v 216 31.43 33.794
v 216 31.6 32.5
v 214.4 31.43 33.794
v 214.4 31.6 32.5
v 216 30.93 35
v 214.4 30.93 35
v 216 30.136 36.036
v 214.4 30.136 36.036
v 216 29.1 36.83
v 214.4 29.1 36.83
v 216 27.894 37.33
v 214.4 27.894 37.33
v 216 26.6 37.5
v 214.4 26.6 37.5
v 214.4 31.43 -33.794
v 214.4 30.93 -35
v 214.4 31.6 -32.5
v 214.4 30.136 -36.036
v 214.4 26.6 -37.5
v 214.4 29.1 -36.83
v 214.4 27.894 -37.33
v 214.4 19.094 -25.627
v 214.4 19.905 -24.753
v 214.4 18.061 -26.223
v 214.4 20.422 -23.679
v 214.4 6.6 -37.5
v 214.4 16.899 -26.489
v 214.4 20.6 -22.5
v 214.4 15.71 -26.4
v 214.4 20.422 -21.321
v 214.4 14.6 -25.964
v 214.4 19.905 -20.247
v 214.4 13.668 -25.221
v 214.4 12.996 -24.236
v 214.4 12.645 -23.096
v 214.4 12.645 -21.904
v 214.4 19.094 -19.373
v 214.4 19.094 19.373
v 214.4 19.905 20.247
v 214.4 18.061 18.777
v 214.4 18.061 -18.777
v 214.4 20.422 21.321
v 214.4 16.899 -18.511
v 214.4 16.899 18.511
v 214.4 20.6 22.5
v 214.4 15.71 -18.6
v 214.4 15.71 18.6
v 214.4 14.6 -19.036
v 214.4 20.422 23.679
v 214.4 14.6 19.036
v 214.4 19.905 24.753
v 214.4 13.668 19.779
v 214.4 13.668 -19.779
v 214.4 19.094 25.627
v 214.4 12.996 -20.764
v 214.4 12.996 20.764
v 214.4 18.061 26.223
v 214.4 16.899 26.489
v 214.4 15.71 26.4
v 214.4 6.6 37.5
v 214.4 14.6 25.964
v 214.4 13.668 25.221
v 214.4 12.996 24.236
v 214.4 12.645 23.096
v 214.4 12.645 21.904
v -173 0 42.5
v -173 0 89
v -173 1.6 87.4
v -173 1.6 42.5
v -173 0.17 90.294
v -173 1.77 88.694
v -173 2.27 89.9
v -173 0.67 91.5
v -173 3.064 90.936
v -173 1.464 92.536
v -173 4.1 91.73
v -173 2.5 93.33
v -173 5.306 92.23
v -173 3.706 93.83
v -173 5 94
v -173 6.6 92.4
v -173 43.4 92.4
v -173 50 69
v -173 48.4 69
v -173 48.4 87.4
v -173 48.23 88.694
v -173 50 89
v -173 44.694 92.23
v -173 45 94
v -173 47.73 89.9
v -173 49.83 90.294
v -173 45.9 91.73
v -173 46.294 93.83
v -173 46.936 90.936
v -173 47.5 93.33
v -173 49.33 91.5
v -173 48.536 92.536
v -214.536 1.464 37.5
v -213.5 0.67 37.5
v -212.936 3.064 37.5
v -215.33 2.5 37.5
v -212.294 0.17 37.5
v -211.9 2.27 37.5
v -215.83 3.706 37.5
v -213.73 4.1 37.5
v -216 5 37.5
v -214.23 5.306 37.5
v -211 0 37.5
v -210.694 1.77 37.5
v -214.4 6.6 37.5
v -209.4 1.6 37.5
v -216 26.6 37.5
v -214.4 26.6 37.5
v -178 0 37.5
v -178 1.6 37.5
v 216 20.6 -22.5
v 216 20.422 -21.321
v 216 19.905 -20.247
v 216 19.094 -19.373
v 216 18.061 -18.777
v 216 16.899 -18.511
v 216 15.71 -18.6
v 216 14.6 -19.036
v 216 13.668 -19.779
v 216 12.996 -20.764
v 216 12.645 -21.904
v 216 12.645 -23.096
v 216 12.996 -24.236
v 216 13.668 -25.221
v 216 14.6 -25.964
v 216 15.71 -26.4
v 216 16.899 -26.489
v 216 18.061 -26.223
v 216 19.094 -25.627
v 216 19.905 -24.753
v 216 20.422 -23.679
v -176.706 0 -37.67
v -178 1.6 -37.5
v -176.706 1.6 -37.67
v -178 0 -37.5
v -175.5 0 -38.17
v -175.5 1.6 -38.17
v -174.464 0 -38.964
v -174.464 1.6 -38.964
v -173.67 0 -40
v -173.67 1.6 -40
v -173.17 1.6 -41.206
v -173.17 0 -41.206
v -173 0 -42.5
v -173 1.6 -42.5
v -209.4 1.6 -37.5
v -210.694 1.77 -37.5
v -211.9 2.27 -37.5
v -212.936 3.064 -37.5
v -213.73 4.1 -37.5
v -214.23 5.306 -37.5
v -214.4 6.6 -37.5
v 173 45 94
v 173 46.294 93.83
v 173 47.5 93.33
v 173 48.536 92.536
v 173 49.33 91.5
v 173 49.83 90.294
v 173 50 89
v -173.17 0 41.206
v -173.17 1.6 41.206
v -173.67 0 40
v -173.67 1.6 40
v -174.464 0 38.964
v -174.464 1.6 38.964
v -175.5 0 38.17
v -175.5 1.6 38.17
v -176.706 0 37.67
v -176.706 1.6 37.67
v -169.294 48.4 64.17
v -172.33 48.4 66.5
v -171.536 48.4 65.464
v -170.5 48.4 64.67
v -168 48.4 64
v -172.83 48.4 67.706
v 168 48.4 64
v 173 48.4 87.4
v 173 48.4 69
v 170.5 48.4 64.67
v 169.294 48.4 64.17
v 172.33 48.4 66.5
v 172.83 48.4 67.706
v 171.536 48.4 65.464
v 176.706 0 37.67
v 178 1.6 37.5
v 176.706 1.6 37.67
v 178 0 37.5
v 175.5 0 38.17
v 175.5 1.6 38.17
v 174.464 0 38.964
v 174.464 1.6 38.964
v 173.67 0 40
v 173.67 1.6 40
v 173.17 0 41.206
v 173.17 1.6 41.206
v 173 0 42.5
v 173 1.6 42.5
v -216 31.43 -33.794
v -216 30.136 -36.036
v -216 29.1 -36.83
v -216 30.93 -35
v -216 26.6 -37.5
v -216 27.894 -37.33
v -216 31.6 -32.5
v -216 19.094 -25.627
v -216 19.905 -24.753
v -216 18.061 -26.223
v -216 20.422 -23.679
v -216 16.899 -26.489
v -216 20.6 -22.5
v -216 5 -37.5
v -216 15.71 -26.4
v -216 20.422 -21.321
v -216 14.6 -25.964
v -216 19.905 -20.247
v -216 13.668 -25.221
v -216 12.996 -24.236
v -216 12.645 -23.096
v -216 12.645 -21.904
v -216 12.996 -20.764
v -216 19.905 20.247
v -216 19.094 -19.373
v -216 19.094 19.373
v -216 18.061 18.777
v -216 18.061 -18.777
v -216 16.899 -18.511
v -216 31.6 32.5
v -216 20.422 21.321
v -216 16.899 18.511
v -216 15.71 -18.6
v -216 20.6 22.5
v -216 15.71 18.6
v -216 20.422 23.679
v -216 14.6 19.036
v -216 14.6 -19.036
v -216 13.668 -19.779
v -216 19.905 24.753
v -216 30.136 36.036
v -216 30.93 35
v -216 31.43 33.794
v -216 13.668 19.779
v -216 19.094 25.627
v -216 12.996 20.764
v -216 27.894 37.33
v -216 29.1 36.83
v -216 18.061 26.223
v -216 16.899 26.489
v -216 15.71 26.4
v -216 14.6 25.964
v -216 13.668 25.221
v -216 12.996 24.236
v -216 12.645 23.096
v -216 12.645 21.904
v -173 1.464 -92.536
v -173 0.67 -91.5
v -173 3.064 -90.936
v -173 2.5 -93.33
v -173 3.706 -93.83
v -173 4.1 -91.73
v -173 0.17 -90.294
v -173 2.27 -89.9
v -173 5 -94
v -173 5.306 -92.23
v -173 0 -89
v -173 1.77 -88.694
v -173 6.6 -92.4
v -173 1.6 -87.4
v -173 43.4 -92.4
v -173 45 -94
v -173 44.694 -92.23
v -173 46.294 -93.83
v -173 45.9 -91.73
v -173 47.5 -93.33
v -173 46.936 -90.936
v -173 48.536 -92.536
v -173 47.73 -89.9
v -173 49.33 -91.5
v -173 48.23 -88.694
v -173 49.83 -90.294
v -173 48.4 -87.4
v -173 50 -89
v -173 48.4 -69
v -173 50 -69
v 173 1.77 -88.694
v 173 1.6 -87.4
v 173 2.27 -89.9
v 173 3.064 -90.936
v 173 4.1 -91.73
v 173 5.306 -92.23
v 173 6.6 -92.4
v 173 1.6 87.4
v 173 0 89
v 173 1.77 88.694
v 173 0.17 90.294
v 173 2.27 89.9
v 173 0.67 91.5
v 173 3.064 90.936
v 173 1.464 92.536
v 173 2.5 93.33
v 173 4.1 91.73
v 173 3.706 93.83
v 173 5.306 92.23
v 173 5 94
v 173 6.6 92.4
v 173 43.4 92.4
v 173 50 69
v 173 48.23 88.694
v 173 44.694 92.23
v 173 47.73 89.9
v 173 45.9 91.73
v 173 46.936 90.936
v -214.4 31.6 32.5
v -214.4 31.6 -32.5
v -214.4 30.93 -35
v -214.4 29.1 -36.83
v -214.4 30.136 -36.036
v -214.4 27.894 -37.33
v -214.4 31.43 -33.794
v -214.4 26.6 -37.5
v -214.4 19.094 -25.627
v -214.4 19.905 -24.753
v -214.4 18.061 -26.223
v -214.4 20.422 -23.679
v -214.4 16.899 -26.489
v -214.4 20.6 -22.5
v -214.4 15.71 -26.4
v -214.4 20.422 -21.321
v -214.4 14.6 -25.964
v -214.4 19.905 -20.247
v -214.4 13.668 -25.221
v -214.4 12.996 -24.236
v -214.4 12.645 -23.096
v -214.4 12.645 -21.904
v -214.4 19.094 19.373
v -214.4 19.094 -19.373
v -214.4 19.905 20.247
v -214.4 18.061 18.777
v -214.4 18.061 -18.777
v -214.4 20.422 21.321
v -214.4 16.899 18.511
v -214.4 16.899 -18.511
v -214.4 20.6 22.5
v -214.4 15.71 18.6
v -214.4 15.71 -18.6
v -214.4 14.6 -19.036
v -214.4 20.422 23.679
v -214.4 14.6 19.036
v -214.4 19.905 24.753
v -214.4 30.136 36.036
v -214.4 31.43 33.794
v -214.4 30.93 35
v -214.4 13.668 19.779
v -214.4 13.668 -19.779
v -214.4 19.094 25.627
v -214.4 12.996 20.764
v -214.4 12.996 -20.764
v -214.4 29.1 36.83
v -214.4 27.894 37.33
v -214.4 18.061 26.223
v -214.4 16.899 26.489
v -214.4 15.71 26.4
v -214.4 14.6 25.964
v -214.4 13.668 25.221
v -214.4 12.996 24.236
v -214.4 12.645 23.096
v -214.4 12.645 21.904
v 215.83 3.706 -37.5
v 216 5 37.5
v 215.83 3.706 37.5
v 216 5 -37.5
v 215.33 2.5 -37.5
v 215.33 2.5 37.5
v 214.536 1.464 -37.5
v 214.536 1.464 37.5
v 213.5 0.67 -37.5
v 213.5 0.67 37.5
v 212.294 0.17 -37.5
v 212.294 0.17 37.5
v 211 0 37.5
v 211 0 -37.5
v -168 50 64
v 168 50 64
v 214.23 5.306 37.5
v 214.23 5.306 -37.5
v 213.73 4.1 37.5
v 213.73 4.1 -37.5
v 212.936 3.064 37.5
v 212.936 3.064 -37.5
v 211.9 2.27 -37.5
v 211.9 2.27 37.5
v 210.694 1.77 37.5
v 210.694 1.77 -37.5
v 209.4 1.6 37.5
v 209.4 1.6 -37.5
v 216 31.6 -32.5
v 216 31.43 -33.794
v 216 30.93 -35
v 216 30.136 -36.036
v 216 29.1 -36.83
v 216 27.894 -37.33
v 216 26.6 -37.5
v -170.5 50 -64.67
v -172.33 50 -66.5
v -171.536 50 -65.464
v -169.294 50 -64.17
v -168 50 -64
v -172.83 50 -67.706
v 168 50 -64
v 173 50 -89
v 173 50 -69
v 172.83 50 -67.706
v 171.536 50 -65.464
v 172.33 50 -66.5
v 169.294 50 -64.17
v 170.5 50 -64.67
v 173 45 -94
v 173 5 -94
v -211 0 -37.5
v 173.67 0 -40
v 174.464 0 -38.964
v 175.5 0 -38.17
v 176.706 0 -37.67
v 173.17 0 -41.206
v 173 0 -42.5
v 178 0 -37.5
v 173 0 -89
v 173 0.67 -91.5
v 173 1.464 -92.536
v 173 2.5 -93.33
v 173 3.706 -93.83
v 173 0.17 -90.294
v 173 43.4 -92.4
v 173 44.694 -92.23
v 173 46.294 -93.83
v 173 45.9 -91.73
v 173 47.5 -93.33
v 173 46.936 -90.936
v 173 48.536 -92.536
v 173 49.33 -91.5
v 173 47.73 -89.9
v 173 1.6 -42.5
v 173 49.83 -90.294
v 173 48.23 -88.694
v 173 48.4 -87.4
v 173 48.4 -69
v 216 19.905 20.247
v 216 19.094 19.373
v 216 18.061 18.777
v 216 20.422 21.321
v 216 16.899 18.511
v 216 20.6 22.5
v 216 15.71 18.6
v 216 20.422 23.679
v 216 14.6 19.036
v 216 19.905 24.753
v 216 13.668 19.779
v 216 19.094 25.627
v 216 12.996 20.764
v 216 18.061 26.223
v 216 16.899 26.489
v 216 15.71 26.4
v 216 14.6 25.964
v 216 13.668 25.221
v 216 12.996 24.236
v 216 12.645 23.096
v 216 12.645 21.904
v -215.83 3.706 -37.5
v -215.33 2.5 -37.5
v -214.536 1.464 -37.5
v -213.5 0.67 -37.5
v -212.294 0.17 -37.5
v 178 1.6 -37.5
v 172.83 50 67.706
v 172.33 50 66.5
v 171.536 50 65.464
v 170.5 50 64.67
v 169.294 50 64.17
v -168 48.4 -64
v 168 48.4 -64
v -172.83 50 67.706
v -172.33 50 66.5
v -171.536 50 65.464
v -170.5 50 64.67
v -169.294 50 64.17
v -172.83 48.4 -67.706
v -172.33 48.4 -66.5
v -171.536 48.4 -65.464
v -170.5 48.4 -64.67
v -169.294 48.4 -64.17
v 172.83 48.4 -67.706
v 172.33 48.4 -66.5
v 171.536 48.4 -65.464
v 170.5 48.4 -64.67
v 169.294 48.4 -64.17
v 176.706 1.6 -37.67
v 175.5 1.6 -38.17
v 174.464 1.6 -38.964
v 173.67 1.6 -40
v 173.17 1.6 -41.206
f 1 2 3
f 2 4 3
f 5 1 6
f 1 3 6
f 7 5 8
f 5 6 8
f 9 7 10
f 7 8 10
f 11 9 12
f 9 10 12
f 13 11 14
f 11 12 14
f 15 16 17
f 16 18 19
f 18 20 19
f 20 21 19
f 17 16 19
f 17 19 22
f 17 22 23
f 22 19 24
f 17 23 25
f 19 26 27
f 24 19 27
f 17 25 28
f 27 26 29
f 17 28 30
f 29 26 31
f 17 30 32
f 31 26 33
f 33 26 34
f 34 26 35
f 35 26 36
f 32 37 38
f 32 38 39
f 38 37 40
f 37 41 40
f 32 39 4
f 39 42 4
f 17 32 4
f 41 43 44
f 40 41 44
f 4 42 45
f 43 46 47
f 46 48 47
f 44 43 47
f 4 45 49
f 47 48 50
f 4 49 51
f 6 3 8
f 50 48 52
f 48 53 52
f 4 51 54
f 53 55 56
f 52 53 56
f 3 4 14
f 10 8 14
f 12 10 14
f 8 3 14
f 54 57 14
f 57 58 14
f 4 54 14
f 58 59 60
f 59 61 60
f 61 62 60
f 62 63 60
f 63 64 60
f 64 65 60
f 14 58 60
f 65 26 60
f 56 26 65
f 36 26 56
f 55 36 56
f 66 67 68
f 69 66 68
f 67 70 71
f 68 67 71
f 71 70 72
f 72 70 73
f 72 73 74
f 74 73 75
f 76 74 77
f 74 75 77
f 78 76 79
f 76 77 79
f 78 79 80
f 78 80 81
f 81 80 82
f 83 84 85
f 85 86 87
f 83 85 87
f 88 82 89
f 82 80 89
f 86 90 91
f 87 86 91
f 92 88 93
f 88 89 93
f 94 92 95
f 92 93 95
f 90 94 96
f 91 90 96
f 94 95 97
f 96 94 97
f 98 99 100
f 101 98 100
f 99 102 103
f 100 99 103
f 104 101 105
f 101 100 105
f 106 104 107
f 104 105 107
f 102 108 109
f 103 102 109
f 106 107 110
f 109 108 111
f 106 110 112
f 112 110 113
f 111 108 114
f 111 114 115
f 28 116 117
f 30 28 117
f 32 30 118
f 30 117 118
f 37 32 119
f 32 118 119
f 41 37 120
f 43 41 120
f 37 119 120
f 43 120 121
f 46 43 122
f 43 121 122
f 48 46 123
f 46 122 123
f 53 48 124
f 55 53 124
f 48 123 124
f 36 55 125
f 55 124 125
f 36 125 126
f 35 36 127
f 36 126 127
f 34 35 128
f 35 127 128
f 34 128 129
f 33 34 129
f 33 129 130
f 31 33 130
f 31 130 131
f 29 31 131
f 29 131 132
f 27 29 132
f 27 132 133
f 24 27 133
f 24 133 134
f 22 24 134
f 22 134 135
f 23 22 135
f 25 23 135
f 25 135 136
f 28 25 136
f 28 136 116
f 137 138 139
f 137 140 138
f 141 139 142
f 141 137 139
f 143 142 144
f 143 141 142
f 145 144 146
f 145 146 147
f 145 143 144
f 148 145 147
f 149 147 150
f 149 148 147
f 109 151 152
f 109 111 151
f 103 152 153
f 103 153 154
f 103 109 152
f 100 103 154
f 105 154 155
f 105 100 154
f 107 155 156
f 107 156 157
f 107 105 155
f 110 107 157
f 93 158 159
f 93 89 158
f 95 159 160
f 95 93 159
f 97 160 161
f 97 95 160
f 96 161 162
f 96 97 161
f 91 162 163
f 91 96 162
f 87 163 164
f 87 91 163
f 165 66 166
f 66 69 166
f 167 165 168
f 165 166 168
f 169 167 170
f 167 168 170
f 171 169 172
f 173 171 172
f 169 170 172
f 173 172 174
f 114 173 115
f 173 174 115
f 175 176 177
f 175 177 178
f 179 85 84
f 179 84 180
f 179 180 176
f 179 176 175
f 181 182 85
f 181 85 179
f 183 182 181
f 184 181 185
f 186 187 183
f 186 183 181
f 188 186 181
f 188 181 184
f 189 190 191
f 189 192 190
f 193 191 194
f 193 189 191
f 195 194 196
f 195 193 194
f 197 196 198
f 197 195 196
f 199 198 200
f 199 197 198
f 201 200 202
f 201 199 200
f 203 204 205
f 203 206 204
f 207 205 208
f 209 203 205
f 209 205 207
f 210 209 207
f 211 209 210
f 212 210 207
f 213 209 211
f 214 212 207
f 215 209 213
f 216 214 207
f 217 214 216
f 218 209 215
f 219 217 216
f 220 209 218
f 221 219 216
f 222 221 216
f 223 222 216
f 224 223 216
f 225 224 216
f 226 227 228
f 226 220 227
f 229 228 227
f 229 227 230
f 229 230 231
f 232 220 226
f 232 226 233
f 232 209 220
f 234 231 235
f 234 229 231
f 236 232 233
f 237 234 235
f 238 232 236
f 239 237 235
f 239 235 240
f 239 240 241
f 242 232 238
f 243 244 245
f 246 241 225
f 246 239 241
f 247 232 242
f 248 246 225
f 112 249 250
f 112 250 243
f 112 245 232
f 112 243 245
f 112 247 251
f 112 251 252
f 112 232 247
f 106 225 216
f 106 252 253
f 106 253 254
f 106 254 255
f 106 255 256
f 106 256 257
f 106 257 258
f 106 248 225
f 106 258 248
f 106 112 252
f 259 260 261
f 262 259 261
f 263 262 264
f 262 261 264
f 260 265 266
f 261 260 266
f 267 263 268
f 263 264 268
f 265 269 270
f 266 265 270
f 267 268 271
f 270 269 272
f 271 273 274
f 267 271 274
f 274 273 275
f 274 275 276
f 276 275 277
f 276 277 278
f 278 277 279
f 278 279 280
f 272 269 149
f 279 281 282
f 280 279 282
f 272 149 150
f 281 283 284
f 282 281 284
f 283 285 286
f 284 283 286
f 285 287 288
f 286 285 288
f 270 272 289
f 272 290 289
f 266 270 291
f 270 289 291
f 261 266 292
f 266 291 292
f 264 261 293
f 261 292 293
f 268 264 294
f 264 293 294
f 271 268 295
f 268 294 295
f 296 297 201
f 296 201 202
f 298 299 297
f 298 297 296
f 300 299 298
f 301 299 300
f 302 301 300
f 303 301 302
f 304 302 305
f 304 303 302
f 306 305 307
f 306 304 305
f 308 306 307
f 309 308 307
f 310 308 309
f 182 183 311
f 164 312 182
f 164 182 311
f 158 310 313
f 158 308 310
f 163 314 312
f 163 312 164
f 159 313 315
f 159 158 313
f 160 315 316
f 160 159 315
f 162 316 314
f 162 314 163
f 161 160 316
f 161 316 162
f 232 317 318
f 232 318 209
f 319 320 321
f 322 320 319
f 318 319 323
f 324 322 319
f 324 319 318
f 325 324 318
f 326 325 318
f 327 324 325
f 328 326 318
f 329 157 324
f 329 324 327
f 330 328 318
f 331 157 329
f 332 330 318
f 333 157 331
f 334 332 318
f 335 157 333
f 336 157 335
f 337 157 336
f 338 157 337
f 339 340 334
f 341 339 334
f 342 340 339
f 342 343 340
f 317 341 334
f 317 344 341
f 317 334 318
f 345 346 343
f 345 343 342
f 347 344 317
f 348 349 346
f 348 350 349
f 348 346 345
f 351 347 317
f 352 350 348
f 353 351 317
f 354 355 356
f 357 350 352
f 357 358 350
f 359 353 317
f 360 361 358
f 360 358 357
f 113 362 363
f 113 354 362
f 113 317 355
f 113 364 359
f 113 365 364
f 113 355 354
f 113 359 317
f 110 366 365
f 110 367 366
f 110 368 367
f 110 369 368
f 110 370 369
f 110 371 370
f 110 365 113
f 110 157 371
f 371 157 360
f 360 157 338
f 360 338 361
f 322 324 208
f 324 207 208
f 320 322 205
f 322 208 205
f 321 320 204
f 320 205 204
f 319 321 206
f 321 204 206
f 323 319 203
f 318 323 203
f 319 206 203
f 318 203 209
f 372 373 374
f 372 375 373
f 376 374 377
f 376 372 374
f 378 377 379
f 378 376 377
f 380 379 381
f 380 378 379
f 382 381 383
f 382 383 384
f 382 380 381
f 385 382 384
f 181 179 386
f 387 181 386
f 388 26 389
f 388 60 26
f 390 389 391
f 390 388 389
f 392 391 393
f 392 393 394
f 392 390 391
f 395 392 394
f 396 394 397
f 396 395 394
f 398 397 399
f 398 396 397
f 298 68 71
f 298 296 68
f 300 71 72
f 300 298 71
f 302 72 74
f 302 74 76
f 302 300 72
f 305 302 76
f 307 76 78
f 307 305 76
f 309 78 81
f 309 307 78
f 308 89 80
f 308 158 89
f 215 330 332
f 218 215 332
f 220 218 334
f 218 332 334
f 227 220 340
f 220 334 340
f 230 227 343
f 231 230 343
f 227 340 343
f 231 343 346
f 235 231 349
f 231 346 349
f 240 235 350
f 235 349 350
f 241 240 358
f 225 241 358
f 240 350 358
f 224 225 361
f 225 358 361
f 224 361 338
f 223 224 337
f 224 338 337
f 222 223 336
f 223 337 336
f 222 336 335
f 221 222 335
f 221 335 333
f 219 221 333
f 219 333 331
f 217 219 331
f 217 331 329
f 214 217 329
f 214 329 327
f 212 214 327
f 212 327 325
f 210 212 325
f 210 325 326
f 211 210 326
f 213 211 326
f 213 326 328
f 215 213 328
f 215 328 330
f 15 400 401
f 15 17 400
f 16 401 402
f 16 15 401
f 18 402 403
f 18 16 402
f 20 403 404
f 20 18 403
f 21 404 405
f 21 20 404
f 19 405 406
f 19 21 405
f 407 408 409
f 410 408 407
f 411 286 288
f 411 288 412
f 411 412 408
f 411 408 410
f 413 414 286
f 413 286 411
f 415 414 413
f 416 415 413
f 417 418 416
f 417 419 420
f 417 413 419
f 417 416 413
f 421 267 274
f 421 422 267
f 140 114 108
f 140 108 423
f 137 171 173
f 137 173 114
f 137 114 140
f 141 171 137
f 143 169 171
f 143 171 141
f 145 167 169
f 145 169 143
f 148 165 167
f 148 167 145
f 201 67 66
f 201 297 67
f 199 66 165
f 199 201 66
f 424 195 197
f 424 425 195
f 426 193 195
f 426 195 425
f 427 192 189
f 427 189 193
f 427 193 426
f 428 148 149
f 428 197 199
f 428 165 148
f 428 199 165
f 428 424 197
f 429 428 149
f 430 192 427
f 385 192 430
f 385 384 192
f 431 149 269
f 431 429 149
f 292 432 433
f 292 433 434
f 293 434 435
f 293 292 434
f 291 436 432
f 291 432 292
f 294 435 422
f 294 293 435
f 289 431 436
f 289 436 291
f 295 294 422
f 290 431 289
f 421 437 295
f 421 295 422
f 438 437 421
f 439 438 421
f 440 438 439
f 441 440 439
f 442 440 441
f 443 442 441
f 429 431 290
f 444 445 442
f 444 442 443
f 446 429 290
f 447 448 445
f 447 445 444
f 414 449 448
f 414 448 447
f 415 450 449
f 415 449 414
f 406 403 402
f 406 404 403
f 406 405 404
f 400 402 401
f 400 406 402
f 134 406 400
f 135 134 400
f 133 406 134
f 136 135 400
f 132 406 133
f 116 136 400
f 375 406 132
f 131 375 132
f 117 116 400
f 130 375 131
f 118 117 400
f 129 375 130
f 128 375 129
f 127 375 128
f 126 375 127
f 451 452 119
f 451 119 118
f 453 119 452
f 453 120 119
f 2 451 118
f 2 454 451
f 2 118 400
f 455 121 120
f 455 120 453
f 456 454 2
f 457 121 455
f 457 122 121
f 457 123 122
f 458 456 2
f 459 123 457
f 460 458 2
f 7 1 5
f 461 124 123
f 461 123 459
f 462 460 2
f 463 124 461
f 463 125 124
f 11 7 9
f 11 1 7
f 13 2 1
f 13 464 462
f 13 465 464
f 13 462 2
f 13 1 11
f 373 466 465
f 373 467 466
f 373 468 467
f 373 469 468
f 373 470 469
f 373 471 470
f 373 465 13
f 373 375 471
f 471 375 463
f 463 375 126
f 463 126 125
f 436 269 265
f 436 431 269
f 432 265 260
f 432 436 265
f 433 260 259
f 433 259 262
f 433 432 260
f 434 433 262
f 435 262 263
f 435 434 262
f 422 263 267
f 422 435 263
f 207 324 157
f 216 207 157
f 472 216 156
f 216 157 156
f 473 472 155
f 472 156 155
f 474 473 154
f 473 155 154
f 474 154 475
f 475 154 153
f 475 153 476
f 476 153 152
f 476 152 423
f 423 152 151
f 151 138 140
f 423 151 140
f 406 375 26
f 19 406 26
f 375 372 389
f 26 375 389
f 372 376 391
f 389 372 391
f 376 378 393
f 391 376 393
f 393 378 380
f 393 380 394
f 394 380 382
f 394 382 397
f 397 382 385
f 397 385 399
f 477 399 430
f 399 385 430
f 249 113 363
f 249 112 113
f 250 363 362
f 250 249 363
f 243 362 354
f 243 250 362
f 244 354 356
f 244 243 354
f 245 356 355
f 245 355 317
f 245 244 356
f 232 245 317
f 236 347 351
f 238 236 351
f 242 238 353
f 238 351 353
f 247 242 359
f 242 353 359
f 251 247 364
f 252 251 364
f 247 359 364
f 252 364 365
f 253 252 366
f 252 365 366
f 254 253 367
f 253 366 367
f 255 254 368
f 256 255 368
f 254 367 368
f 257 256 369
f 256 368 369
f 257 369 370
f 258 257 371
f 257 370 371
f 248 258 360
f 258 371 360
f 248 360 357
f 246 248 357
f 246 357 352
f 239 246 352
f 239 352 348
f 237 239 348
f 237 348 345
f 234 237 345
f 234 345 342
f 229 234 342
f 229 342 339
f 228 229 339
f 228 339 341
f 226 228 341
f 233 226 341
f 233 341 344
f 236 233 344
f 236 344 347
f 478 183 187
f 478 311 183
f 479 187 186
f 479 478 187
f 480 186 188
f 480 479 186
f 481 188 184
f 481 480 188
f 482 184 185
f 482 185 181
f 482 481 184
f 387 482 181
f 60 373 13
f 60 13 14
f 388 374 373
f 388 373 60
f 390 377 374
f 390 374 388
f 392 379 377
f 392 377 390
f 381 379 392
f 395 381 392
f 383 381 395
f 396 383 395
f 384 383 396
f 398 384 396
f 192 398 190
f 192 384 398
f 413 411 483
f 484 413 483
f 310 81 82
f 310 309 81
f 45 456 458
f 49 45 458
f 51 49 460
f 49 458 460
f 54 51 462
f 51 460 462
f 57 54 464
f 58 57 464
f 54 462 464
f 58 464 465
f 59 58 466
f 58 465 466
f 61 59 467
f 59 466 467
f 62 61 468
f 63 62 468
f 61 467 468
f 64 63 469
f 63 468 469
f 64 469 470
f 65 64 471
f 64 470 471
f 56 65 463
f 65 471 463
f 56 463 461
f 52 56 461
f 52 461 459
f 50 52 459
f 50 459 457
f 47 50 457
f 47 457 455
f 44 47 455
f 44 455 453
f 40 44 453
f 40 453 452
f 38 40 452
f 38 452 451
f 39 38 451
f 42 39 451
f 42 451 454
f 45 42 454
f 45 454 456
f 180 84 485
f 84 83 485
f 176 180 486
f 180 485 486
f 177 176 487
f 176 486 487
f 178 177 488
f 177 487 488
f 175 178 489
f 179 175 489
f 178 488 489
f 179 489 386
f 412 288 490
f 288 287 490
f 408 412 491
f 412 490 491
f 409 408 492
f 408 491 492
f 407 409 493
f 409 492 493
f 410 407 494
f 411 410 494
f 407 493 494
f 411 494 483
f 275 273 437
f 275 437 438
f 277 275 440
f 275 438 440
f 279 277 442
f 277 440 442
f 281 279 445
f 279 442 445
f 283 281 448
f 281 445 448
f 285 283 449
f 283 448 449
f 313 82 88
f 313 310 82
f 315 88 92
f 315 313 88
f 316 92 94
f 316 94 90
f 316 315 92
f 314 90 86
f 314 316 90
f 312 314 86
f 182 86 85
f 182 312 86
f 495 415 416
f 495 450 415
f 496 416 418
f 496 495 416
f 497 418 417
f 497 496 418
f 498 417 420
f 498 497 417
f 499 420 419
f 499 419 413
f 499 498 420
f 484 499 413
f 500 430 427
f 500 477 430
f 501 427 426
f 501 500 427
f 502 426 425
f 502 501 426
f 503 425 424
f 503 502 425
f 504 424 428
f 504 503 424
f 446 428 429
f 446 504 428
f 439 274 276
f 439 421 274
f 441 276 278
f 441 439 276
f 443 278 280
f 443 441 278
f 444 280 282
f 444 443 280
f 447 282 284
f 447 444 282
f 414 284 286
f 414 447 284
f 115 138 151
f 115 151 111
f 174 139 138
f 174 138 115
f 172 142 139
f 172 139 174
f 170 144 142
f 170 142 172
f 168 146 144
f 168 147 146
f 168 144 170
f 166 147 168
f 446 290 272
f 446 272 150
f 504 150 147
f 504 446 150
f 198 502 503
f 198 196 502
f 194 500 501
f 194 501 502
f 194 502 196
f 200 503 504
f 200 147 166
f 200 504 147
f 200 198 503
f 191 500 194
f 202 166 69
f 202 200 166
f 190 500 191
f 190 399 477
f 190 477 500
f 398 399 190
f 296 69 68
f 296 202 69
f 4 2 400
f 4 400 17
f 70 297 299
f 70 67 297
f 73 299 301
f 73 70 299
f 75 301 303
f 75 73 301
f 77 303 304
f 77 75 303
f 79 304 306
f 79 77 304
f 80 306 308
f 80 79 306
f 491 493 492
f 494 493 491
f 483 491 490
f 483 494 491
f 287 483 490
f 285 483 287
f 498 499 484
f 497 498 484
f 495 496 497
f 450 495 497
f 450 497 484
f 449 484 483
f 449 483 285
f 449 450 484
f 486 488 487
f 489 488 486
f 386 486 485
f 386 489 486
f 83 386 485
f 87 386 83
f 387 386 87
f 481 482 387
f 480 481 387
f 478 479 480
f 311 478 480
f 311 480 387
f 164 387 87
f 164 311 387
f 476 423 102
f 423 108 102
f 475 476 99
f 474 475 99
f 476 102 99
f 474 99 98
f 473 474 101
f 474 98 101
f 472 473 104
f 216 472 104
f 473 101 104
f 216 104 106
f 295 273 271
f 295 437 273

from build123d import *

# Parameters (mm, degrees)
F1_DEPTH = 173
F3_DEPTH = 43
F5_DEPTH = 43
F6_W     = 1.6
F6_H     = 75
F7_DEPTH = 30
F8_R     = 4
F9_DEPTH = 432.001
F10_R    = 5


with BuildPart() as f1:
    # F0 (on Right) → F1 (new body, symmetric)
    with BuildSketch(Plane.YZ):
        Polygon((0, 94), (0, 0), (0, -94), (50, -94), (50, -64), (48.4, -64), (48.4, -92.4), (1.6, -92.4), (1.6, 92.4), (48.4, 92.4), (48.4, 64), (50, 64), (50, 94), align=None)
    extrude(amount=F1_DEPTH, both=True)

    # F2 (on face) → F3 (join)
    with BuildSketch(Plane.YZ.offset(173)):
        Polygon((0, 37.5), (0, 0), (0, -37.5), (1.6, -37.5), (1.6, 37.5), align=None)
    extrude(amount=F3_DEPTH)

    # F4 (on face) → F5 (join)
    with BuildSketch(Plane(origin=(-173, 0, 0), x_dir=(0, -1, 0), z_dir=(-1, 0, 0))):
        Polygon((0, -37.5), (0, 0), (0, 37.5), (-1.6, 37.5), (-1.6, -37.5), align=None)
    extrude(amount=F5_DEPTH)

    # F6 (on face) → F7 (join)
    with BuildSketch(Plane(origin=(0, 1.6, 0), x_dir=(-1, 0, 0), z_dir=(0, 1, 0))):
        with Locations((-215.2, 0)):
            Rectangle(F6_W, F6_H)
        with Locations((215.2, 0)):
            Rectangle(F6_W, F6_H)
    extrude(amount=F7_DEPTH)

    # F8 (on face) → F9 (cut, through all)
    with BuildSketch(Plane.YZ.offset(216)):
        with Locations((16.6, 22.5)):
            Circle(F8_R)
        with Locations((16.6, -22.5)):
            Circle(F8_R)
    extrude(amount=-F9_DEPTH, mode=Mode.SUBTRACT)

    # F10
    f10_edges = [f1.edges().sort_by_distance(p)[0] for p in [
        (173, 0.8, 37.5),
        (215.2, 31.6, -37.5),
        (173, 0.8, -37.5),
        (173, 49.2, 64),
        (173, 49.2, -64),
        (215.2, 31.6, 37.5),
        (-173, 49.2, -64),
        (-173, 0.8, -37.5),
        (-215.2, 31.6, -37.5),
        (-215.2, 31.6, 37.5),
        (-173, 0.8, 37.5),
        (-173, 49.2, 64),
        (0, 50, -94),
        (0, 0, -94),
        (-216, 0, 0),
        (0, 1.6, -92.4),
        (0, 48.4, -92.4),
        (-214.4, 1.6, 0),
        (214.4, 1.6, 0),
        (216, 0, 0),
        (0, 0, 94),
        (0, 50, 94),
        (0, 48.4, 92.4),
        (0, 1.6, 92.4),
    ]]
    fillet(f10_edges, radius=F10_R)


solid = f1.part
